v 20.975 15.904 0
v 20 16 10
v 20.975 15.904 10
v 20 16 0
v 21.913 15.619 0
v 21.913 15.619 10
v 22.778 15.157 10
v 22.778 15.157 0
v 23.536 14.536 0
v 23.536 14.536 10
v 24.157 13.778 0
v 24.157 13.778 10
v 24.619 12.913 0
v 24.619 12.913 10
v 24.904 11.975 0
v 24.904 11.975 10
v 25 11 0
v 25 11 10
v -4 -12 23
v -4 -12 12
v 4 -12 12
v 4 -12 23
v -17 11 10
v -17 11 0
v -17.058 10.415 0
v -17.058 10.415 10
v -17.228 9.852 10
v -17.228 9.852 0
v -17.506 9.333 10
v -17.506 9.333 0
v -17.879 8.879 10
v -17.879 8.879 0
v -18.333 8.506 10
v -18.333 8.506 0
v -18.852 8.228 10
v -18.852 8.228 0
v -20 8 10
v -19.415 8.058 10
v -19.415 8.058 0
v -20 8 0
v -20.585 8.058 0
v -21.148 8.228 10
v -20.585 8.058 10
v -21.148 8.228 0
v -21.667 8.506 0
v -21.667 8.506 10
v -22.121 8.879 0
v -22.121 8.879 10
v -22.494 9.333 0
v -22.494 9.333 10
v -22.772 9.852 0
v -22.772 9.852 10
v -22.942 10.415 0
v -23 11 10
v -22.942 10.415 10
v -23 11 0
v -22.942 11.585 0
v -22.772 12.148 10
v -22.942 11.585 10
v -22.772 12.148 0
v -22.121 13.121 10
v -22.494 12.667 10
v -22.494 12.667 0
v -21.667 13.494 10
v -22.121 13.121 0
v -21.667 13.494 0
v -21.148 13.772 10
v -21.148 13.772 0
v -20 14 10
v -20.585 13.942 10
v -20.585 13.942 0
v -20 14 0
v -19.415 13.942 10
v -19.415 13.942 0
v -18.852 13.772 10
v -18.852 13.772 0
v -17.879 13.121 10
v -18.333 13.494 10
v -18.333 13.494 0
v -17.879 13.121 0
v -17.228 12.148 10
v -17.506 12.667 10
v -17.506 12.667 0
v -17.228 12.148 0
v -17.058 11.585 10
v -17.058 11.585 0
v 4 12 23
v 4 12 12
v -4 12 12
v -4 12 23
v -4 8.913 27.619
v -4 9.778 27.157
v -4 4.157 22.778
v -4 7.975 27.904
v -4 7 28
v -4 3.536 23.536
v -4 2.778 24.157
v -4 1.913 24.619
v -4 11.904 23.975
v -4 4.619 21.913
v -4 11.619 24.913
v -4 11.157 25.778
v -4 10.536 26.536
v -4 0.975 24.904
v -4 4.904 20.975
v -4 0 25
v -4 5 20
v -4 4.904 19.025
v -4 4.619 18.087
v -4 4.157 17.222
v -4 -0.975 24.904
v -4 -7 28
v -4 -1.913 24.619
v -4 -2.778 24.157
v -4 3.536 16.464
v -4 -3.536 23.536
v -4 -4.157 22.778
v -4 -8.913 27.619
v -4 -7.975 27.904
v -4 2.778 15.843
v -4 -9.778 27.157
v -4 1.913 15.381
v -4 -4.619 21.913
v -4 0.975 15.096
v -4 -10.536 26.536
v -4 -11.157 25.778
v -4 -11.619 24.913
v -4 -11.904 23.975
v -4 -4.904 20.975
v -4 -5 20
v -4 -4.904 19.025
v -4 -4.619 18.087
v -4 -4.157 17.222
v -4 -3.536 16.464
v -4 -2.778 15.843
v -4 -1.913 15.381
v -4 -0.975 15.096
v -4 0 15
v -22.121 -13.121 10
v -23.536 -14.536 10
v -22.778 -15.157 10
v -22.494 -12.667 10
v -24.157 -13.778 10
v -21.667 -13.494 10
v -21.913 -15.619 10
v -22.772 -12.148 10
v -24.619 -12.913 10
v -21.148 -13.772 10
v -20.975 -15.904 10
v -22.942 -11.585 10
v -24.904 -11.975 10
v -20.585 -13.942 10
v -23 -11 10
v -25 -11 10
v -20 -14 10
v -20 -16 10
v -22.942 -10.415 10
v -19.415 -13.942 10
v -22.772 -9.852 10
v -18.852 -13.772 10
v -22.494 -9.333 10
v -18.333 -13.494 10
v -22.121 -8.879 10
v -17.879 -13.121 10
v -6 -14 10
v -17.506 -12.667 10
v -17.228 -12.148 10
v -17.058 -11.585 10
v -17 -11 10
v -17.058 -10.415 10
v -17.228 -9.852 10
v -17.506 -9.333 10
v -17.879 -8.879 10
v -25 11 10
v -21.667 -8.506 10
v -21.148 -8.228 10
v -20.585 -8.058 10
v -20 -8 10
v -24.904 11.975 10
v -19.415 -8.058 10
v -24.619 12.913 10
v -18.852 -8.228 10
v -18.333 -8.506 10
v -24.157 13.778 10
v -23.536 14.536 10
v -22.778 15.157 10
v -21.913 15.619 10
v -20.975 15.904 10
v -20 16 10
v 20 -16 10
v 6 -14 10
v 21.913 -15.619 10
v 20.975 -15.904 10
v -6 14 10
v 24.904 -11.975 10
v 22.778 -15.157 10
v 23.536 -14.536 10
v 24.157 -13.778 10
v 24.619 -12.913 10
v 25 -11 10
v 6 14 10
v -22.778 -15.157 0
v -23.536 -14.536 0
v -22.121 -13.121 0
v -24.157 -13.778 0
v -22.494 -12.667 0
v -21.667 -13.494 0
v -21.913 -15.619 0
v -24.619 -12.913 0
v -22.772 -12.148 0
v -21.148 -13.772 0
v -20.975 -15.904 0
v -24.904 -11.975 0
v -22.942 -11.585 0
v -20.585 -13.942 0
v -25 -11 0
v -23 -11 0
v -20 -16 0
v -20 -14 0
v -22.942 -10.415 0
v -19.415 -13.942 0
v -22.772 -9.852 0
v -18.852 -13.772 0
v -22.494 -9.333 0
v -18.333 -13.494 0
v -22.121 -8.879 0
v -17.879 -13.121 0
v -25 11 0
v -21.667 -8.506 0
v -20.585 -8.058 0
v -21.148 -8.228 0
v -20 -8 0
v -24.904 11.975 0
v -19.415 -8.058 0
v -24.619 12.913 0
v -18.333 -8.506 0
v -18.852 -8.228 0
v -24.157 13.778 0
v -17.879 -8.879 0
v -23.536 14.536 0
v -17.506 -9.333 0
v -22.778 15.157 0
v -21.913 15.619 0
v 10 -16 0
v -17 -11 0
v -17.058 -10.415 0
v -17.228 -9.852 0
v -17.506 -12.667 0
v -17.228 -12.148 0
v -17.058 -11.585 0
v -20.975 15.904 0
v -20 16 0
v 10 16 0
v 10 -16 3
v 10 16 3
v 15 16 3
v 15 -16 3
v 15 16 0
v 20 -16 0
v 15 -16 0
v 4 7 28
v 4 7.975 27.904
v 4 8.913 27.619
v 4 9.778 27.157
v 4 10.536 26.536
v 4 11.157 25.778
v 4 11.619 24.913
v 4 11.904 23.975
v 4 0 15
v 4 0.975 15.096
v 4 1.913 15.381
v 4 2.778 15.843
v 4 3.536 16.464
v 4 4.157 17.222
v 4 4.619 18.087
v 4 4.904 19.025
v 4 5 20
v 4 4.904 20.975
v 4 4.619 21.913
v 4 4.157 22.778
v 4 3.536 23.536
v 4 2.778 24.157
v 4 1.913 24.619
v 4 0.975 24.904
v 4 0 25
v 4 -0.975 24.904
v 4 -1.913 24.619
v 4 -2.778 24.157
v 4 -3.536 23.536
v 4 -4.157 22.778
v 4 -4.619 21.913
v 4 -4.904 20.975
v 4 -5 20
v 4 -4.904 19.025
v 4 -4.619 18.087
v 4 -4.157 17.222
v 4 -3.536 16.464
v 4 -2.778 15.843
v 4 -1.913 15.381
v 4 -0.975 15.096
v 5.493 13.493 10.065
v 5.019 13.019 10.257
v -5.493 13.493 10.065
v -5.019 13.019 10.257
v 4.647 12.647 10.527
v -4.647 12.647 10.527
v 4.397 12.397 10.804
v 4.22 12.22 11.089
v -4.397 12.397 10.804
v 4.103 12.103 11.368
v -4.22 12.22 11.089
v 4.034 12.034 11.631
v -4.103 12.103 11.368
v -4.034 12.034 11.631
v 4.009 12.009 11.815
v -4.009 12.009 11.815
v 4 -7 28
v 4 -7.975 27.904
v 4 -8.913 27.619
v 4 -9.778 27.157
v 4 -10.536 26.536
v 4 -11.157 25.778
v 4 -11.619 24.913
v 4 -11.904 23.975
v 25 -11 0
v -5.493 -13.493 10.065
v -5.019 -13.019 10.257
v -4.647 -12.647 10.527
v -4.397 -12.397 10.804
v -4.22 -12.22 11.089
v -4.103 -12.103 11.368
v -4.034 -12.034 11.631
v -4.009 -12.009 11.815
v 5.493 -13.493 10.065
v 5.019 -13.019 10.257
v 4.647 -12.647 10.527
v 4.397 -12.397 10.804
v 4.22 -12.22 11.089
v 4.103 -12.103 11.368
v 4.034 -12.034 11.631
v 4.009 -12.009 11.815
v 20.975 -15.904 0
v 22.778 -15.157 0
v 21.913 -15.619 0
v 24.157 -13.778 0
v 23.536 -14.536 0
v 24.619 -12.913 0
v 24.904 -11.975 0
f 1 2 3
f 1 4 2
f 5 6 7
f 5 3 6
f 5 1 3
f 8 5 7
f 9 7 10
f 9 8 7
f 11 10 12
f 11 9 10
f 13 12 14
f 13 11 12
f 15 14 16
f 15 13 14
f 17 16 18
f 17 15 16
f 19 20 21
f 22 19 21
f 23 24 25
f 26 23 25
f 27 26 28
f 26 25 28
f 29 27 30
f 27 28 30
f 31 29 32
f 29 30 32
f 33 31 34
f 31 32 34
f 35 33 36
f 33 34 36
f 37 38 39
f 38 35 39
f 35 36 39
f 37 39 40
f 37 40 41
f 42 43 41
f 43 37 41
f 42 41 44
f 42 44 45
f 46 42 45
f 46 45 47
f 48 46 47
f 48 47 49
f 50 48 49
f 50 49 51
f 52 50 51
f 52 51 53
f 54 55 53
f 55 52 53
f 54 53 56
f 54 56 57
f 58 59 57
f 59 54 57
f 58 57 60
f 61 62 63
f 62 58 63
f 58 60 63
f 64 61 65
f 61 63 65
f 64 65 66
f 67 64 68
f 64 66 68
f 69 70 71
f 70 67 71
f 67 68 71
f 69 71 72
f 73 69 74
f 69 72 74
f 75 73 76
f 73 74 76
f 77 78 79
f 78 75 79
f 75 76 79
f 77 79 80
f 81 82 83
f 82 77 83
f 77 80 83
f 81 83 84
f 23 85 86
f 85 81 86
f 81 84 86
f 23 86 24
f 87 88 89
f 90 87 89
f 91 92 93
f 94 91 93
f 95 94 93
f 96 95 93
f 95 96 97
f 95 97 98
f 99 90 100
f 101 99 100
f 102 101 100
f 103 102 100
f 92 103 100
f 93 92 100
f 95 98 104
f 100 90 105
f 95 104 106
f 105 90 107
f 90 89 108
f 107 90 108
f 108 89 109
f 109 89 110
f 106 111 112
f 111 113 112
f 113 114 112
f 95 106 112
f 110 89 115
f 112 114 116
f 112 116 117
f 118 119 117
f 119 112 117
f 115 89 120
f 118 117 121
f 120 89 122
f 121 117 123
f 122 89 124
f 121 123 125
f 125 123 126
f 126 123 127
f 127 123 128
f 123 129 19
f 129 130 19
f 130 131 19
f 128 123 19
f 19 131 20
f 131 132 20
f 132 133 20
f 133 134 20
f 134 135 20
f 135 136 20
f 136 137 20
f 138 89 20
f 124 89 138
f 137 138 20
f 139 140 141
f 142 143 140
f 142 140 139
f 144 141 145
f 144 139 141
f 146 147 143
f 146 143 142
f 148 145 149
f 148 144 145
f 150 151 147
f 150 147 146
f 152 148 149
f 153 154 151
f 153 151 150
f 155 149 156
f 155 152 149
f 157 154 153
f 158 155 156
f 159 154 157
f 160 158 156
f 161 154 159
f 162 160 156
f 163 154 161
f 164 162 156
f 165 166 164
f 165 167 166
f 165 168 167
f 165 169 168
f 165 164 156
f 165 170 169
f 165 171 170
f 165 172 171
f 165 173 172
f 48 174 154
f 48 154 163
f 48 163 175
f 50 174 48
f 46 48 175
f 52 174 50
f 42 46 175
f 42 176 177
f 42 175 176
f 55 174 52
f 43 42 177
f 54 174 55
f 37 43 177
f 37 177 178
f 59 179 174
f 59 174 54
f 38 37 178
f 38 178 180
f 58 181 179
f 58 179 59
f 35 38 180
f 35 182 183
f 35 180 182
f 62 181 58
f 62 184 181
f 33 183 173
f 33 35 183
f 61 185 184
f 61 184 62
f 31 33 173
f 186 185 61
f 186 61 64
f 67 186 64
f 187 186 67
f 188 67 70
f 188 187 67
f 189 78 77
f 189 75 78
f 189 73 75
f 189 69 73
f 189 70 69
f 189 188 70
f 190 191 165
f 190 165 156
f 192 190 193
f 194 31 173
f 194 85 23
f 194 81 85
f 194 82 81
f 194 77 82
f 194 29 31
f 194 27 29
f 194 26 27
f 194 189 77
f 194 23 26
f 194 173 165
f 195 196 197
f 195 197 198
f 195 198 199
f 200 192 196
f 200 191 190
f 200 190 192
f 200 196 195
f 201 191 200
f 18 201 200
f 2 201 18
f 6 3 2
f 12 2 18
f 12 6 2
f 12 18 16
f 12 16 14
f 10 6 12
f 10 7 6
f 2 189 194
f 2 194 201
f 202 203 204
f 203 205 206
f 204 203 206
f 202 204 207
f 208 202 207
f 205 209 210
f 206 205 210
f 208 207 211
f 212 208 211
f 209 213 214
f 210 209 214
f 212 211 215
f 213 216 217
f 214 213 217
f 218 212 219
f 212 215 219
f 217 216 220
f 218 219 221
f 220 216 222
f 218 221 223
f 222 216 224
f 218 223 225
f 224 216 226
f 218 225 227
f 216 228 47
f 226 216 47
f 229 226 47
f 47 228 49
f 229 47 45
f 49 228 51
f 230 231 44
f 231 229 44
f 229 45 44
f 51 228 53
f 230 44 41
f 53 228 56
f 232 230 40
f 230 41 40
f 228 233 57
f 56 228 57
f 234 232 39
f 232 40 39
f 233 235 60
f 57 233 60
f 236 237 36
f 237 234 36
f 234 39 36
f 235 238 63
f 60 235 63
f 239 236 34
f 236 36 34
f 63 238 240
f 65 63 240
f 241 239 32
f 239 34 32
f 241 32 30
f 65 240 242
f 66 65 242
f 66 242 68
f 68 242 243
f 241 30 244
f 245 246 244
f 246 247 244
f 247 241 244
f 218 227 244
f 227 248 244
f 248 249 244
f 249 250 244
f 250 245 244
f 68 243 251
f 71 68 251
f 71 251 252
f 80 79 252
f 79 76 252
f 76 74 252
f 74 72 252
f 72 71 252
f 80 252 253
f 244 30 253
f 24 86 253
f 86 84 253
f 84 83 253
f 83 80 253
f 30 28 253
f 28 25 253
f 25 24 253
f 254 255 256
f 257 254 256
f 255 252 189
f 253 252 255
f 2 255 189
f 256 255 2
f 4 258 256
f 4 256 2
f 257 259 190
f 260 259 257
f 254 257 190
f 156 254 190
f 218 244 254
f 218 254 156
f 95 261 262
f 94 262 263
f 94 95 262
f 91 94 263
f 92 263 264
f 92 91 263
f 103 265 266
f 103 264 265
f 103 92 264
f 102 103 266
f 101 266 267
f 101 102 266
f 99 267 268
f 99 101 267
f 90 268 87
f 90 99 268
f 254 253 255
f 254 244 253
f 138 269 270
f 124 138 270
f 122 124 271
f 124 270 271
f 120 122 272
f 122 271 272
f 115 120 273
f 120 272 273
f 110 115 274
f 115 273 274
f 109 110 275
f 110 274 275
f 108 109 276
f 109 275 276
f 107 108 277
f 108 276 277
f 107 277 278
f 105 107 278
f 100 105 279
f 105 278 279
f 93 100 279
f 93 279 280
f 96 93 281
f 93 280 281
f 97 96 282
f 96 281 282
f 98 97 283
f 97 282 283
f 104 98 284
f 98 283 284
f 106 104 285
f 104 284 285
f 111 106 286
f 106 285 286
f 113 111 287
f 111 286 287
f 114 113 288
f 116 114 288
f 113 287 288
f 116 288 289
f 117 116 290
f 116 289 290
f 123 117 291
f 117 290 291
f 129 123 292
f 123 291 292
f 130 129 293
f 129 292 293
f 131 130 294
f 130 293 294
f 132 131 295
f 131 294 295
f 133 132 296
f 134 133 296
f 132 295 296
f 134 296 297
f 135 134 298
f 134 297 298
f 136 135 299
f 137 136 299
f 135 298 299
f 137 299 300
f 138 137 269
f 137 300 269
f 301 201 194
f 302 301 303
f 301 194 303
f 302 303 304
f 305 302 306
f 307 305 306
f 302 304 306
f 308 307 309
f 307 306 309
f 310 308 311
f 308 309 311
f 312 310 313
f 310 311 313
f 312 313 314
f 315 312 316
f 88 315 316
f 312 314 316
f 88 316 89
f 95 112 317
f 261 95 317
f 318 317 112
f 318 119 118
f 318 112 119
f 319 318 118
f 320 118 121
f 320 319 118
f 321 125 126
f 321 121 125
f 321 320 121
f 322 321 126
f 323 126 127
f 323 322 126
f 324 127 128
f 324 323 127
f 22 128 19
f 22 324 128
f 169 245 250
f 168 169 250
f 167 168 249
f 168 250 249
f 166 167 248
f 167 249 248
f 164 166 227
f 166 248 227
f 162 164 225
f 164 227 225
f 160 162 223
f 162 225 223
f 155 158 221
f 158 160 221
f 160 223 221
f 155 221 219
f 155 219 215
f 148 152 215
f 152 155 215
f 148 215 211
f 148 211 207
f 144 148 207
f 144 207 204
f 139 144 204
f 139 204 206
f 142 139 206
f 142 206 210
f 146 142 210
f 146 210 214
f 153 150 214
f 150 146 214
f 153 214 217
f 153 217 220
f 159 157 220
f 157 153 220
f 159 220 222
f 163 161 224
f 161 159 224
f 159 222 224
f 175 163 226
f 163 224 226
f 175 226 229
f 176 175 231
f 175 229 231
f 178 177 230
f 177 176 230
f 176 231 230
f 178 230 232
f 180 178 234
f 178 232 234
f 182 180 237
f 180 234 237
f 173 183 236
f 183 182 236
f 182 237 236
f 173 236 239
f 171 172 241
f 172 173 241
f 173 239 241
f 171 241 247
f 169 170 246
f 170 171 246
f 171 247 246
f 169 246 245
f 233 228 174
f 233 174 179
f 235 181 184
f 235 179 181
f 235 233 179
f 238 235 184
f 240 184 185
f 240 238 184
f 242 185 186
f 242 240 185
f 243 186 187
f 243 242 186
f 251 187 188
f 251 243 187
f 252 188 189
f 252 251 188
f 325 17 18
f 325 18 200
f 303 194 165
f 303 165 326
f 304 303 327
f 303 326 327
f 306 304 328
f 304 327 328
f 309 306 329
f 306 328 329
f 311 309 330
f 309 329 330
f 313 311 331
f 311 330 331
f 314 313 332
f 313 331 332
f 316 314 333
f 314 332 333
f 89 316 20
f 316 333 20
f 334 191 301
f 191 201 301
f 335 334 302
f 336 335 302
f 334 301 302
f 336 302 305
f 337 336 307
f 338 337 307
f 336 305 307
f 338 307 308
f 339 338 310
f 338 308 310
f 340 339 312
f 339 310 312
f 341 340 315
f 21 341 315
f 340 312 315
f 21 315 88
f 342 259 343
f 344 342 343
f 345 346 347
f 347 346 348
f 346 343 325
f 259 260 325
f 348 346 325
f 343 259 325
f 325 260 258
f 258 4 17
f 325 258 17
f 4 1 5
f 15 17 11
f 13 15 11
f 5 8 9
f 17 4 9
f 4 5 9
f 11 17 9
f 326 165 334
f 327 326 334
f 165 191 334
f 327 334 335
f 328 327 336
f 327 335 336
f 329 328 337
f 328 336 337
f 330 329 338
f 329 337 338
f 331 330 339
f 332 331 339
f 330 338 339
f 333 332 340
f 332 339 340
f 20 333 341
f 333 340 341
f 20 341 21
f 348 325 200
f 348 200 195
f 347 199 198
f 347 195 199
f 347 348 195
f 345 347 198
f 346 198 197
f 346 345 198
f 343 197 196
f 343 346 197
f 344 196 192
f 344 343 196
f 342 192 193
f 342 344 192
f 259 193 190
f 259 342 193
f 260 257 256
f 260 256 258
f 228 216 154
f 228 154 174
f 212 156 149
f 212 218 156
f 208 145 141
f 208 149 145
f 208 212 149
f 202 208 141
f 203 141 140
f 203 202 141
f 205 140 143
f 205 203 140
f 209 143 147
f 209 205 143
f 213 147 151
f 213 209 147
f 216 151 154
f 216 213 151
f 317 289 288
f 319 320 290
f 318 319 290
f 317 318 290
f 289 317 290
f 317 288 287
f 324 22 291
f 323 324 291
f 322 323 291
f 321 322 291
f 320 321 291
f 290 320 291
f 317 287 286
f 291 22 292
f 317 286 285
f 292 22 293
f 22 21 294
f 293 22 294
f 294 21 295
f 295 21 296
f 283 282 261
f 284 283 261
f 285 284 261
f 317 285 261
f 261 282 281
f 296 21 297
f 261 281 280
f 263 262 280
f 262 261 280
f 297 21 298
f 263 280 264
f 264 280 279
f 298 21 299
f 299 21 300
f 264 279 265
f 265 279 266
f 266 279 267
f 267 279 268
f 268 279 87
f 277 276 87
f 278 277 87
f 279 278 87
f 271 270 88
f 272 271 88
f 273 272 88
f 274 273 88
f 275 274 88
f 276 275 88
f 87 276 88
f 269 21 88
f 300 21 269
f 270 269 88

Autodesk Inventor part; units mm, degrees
ref_plane "YZ Plane" through (0, 0, 0) normal (1, 0, 0) x (0, 1, 0)
ref_plane "XZ Plane" through (0, 0, 0) normal (0, 1, 0) x (-1, 0, 0)
ref_plane "XY Plane" through (0, 0, 0) normal (0, 0, 1) x (1, 0, 0)
sketch "Szkic1" plane through (0, 0, 0) normal (0, 0, 1) x (1, 0, 0)
  line L0 (-20, 16) -> (20, 16)
  line L1 (25, 11) -> (25, -11)
  line L2 (20, -16) -> (-20, -16)
  line L3 (-25, -11) -> (-25, 11)
  line L4 (-25, 16) -> (25, -16) construction
  line L5 (25, 16) -> (-25, -16) construction
  arc A0 (25, 11) -> (20, 16) centre (20, 11) ccw
  arc A1 (20, -16) -> (25, -11) centre (20, -11) ccw
  arc A2 (-25, -11) -> (-20, -16) centre (-20, -11) ccw
  arc A3 (-20, 16) -> (-25, 11) centre (-20, 11) ccw
  circle A4 centre (-20, 11) radius 3
  circle A5 centre (-20, -11) radius 3
  point P0 (0, 0)
  dimension "d0" = 50
  dimension "d1" = 32
  dimension "d3" = 5
  dimension "d4" = 5
  dimension "d5" = 6
  dimension "d6" = 6
extrude "Wyciągnięcie proste1" add sketch "Szkic1" along normal blind 10
sketch "Szkic2" plane through (0, 0, 10) normal (0, 0, 1) x (1, 0, 0)
  line L0 (-4, -12) -> (4, -12)
  line L1 (4, -12) -> (4, 12)
  line L2 (4, 12) -> (-4, 12)
  line L3 (-4, 12) -> (-4, -12)
  line L4 (-4, -12) -> (4, 12) construction
  line L5 (4, -12) -> (-4, 12) construction
  point P0 (0, 0)
  dimension "d9" = 8
  dimension "d10" = 24
extrude "Wyciągnięcie proste2" add sketch "Szkic2" along normal blind 18
sketch "Szkic3" plane through (4, -12, 10) normal (1, 0, 0) x (0, 0, -1)
  line L0 (0, 24) -> (-18, 24) construction
  line L1 (-9, 24) -> (-9, 0) construction
  line L2 (0, 0) -> (-18, 0) construction
  line L3 (-18, 0) -> (-18, 24) construction
  line L4 (-18, 12) -> (0, 12) construction
  line L5 (0, 23) -> (0, 1) construction
  circle A0 centre (-10, 12) radius 5
  line L6 (-18, 12) -> (-10, 12) construction
  point P0 (10, 12)
  dimension "d13" = 10
  dimension "d28" = 8
extrude "Wyciągnięcie proste3" cut sketch "Szkic3" against normal up to next
fillet "Zaokrąglenie1" radius 2 4 edges at (0, 12, 10) (4, 0, 10) (0, -12, 10) (-4, 0, 10)
fillet "Zaokrąglenie2" radius 5 2 edges at (0, -12, 28) (0, 12, 28)
sketch "Szkic4" plane through (-20, -16, 0) normal (0, -1, 0) x (1, 0, 0)
  line L0 (40, 0) -> (40, 10) construction
  line L1 (45, 0) -> (40, 0) projected
  line L2 (45, 0) -> (35, 0)
  line L3 (35, 0) -> (30, 0)
  line L4 (30, 0) -> (30, 3)
  line L5 (30, 3) -> (35, 3)
  line L6 (35, 3) -> (35, 0)
  dimension "d23" = 10
  dimension "d24" = 5
  dimension "d25" = 3
extrude "Wyciągnięcie proste4" cut sketch "Szkic4" against normal up to next
properties part number "Bartosz_Zukowski_IP_model_4.ipj"
